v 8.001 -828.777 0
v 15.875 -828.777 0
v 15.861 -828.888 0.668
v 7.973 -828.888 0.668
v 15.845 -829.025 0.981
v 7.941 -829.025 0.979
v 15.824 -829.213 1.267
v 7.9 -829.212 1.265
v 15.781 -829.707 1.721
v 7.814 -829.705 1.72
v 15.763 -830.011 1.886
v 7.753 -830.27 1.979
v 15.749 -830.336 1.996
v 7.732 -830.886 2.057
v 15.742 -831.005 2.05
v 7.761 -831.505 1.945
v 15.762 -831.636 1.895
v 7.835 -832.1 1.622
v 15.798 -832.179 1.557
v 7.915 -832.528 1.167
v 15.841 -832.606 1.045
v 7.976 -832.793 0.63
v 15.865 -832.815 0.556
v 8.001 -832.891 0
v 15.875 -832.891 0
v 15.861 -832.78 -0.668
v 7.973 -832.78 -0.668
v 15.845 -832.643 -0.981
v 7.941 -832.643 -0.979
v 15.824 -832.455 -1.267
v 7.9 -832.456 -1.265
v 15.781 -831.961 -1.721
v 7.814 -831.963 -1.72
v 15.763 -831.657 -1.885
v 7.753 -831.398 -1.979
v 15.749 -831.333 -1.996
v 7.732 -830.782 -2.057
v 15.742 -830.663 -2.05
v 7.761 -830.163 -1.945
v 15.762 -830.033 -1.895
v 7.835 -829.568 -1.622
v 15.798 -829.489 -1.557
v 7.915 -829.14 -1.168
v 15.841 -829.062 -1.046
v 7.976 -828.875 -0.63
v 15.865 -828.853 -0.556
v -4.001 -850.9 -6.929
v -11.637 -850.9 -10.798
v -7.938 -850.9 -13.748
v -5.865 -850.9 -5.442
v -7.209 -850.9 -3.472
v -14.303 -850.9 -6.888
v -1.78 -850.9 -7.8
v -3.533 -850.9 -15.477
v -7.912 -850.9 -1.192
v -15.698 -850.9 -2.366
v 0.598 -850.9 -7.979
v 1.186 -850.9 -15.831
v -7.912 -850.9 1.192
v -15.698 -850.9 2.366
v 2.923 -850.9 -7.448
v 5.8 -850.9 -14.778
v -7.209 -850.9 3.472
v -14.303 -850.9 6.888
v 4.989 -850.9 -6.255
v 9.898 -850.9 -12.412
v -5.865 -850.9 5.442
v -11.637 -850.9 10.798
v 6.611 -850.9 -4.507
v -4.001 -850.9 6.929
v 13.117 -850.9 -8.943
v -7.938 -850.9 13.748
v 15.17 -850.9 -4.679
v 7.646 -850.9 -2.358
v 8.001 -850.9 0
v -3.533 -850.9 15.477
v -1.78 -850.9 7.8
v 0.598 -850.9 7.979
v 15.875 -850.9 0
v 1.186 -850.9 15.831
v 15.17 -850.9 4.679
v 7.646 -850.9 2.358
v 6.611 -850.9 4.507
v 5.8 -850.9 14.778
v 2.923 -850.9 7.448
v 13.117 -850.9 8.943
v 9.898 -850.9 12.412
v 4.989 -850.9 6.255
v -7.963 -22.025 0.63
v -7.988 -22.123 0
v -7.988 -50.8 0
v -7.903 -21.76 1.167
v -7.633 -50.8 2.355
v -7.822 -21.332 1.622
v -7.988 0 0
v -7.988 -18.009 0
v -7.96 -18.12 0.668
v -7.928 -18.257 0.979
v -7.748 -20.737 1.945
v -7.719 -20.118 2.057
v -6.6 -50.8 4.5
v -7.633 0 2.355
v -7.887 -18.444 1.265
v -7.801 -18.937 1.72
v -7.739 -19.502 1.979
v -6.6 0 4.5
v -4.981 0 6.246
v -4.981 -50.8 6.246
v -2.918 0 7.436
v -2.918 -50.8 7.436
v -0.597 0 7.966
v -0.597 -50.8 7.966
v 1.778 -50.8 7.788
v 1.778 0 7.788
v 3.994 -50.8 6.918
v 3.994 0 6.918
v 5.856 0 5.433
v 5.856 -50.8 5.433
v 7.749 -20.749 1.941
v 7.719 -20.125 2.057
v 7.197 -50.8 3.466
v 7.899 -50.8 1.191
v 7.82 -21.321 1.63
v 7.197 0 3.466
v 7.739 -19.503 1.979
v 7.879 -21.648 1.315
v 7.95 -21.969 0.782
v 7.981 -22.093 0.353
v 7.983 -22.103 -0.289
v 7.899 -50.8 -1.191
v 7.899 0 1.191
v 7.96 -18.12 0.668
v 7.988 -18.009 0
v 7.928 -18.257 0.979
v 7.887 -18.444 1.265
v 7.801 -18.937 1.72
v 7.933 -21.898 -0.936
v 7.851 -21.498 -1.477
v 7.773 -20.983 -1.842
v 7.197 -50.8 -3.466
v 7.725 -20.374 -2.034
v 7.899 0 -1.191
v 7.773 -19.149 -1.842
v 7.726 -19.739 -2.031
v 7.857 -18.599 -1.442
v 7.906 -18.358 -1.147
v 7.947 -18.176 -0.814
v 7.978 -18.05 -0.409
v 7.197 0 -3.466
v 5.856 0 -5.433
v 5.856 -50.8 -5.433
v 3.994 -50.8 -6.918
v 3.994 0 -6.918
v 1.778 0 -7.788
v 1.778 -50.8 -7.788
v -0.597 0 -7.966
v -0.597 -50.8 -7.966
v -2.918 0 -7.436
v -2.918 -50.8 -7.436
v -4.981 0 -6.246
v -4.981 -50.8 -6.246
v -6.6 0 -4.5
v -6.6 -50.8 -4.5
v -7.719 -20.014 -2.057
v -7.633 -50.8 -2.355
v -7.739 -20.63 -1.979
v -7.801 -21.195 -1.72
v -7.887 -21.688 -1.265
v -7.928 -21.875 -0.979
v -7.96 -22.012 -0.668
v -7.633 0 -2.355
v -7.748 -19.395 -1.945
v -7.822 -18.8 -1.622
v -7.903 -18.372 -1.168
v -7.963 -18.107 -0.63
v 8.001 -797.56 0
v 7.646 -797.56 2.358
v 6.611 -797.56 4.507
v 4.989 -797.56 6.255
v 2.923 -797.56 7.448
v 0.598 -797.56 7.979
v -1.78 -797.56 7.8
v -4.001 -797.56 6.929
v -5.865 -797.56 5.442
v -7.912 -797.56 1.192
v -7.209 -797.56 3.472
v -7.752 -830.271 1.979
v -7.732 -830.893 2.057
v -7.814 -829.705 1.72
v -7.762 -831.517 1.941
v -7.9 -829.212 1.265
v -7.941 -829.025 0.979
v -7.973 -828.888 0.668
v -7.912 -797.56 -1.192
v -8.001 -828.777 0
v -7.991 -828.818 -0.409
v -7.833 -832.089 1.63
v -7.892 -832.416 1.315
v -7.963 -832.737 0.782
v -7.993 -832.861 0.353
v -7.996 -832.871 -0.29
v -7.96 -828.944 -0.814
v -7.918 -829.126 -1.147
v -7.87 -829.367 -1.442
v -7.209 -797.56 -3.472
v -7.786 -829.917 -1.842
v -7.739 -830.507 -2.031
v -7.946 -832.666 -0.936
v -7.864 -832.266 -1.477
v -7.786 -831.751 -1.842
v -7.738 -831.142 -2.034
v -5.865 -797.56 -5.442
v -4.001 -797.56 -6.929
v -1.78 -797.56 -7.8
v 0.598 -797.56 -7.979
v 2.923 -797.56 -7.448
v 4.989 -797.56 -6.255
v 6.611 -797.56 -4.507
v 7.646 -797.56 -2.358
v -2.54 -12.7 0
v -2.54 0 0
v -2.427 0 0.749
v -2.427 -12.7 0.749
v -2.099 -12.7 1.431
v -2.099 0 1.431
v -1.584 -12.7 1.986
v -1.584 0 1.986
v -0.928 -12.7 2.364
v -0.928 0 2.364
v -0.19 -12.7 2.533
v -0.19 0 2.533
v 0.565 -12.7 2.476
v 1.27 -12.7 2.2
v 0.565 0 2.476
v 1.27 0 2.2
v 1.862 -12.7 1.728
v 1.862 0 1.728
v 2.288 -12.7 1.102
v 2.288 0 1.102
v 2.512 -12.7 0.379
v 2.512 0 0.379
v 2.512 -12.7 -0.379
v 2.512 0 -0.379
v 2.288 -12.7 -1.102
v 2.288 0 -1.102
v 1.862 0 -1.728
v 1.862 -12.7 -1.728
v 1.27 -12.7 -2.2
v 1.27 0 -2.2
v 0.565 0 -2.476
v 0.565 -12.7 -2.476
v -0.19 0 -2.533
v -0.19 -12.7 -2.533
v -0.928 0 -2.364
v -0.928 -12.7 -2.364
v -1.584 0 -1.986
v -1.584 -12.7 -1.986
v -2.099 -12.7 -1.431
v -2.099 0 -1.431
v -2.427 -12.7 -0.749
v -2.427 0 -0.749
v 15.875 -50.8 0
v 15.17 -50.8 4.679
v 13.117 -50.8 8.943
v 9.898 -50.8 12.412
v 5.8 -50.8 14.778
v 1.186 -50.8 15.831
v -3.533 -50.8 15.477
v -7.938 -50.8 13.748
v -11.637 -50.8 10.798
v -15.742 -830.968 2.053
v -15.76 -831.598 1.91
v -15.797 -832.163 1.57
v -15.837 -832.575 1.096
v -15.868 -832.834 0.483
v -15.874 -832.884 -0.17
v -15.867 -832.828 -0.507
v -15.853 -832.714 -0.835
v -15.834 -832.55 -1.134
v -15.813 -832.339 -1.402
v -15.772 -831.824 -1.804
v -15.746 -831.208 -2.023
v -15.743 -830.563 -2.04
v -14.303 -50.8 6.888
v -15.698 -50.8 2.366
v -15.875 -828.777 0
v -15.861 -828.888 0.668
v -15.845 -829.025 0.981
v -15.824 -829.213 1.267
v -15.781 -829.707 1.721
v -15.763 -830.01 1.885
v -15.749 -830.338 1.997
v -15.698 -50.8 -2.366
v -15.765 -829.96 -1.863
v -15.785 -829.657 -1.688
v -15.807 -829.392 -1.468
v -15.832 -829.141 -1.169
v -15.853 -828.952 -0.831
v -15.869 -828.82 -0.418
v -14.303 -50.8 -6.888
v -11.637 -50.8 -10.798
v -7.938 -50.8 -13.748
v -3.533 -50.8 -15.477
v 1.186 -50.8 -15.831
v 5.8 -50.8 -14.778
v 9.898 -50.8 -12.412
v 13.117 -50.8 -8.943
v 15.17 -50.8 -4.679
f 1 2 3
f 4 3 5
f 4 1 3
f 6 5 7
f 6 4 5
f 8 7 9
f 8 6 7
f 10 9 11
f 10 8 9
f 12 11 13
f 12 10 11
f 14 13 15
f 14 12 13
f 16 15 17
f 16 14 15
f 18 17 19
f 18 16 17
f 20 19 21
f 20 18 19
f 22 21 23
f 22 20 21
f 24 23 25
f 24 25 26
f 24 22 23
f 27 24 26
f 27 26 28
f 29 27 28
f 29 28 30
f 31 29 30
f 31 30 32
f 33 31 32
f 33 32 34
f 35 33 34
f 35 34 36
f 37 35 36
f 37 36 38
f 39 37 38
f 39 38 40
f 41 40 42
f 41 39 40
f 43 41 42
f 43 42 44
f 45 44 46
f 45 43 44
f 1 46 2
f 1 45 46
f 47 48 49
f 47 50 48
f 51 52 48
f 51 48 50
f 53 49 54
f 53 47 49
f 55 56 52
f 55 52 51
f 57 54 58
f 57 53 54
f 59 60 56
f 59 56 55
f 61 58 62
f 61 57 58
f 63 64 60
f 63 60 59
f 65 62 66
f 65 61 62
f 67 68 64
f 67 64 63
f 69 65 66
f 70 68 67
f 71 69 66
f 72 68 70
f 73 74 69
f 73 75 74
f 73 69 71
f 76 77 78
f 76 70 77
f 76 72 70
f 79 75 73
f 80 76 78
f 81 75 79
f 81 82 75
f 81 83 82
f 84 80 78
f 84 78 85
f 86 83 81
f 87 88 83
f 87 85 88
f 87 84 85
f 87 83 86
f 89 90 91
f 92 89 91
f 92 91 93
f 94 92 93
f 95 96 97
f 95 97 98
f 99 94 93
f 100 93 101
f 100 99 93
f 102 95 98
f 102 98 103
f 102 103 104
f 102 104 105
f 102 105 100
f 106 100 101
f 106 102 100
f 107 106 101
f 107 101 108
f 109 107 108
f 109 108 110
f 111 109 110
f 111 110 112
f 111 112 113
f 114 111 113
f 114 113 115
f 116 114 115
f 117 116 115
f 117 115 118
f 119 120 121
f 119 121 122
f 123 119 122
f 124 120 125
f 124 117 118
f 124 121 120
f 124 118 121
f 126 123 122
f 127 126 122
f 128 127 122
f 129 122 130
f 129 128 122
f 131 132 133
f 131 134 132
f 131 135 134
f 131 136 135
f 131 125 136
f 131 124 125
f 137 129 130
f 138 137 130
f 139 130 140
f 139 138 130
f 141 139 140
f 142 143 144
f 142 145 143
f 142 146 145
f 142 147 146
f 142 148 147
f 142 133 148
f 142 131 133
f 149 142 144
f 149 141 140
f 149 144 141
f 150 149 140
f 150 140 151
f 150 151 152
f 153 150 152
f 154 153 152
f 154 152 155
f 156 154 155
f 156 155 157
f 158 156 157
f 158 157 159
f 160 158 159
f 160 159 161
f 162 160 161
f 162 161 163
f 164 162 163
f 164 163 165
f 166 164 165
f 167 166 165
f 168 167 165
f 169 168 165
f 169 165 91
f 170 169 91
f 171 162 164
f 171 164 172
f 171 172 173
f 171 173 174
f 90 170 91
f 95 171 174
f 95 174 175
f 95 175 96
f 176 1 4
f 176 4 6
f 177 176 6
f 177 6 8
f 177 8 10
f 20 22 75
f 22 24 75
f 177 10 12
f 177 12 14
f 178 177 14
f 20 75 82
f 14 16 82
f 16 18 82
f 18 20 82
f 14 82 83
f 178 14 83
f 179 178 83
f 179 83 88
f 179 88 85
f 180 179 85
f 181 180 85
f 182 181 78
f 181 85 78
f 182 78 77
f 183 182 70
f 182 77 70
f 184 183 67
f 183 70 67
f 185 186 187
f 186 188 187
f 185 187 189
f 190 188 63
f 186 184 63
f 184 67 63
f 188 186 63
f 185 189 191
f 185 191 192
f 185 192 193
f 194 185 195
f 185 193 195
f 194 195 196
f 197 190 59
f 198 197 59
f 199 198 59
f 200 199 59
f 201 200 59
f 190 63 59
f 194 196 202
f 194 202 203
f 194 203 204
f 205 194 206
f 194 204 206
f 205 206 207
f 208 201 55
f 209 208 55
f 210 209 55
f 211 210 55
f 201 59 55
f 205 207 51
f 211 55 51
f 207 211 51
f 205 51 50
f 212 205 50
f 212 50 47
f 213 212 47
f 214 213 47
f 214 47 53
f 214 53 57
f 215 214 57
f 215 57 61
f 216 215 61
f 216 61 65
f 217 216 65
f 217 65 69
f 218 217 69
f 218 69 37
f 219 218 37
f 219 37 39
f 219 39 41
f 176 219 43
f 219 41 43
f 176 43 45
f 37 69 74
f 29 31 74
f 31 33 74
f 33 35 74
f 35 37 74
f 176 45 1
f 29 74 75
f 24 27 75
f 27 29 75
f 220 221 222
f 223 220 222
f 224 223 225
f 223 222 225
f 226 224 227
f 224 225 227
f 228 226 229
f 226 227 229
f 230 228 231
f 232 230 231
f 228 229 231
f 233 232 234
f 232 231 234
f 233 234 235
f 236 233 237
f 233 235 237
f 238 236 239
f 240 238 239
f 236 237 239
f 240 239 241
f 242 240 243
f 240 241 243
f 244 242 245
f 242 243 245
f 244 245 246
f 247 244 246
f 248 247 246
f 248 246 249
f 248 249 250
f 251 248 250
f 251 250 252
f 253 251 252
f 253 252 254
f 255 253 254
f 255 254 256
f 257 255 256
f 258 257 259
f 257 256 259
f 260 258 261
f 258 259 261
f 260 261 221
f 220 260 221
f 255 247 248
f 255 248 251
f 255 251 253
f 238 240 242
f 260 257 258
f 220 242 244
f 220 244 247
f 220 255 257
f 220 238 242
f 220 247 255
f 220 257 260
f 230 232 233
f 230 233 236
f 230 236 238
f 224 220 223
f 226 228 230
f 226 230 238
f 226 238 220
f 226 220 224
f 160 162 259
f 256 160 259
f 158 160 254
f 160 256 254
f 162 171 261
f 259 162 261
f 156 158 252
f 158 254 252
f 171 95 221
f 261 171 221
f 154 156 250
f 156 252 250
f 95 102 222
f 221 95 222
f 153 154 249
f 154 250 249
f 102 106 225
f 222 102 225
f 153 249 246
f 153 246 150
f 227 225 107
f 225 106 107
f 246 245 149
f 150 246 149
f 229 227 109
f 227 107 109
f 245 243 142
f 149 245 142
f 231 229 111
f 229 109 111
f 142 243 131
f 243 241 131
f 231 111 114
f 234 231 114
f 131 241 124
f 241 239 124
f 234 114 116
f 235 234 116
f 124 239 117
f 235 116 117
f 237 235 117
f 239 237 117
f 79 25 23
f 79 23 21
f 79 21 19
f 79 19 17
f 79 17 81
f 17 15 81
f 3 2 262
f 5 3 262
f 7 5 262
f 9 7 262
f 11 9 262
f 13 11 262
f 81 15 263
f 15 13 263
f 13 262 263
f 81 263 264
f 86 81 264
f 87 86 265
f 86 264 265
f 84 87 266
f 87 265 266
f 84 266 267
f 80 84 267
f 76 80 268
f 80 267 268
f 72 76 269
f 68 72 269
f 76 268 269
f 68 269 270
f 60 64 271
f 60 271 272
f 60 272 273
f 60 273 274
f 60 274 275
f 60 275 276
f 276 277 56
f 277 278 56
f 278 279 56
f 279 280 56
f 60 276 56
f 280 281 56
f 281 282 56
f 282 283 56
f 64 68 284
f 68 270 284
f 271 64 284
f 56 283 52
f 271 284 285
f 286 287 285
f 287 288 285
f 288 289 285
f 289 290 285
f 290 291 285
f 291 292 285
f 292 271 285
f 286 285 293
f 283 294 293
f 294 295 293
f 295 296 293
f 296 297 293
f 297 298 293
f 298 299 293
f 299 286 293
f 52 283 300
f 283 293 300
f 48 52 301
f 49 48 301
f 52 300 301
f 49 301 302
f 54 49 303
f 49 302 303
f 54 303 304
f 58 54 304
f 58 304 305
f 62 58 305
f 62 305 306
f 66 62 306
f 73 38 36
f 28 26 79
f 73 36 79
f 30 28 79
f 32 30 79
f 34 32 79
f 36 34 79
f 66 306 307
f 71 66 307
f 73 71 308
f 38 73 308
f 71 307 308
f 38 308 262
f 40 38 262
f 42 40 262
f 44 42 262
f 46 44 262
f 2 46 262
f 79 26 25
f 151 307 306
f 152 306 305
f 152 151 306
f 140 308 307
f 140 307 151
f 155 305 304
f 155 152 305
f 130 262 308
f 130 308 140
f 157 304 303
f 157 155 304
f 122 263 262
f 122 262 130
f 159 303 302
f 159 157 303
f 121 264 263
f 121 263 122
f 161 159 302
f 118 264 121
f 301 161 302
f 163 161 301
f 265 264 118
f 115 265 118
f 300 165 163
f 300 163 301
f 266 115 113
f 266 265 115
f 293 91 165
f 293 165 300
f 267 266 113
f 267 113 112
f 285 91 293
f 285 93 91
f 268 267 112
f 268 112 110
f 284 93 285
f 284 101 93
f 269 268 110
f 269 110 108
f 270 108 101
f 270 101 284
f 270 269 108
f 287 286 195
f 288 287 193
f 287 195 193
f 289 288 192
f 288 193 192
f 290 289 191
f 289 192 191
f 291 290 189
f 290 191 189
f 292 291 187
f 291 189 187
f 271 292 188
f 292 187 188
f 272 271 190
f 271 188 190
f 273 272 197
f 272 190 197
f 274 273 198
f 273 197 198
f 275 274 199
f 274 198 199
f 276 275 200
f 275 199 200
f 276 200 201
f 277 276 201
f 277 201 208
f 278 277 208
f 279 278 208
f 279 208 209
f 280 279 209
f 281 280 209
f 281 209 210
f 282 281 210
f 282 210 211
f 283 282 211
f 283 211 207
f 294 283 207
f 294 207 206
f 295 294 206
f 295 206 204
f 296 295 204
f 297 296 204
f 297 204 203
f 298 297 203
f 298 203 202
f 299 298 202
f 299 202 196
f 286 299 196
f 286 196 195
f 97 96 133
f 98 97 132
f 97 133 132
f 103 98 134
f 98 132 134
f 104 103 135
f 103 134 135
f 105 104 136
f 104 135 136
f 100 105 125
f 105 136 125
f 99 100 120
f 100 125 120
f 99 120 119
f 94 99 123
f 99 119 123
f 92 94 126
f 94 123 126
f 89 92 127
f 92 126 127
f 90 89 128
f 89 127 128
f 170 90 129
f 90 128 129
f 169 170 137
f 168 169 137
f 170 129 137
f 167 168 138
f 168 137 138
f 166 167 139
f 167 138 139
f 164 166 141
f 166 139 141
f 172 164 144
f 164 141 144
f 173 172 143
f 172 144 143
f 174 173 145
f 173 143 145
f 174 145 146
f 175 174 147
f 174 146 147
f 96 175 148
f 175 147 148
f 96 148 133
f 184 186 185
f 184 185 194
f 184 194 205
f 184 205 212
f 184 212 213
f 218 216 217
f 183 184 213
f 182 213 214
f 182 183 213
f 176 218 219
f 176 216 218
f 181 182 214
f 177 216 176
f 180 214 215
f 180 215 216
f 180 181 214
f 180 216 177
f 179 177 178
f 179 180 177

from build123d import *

# Parameters (mm, degrees)
F0_R     = 15.875
F1_DEPTH = 850.9
F2_R     = 8.001
F3_DEPTH = 53.34
F4_R     = 2.0574
F5_DEPTH = 25.4
F6_R     = 15.875
F6_R_2   = 7.9883
F7_DEPTH = 50.8
F8_R     = 2.54
F9_DEPTH = 12.7


with BuildPart() as f1:
    # F0 (on Front) → F1 (new body)
    with BuildSketch(Plane.XZ):
        Circle(F0_R)
    extrude(amount=F1_DEPTH)

    # F2 (on face) → F3 (cut)
    with BuildSketch(Plane.XZ.offset(850.9)):
        Circle(F2_R)
    extrude(amount=-F3_DEPTH, mode=Mode.SUBTRACT)

    # F4 (on Right) → F5 (cut, symmetric)
    with BuildSketch(Plane.YZ):
        with Locations((-830.834, 0)):
            Circle(F4_R)
        with Locations((-20.066, 0)):
            Circle(F4_R)
    extrude(amount=F5_DEPTH, both=True, mode=Mode.SUBTRACT)

    # F6 (on face) → F7 (cut)
    with BuildSketch(Plane(origin=(0, 0, 0), x_dir=(-1, 0, 0), z_dir=(0, 1, 0))):
        Circle(F6_R)
        Circle(F6_R_2, mode=Mode.SUBTRACT)
    extrude(amount=-F7_DEPTH, mode=Mode.SUBTRACT)

    # F8 (on face) → F9 (cut)
    with BuildSketch(Plane(origin=(0, 0, 0), x_dir=(-1, 0, 0), z_dir=(0, 1, 0))):
        Circle(F8_R)
    extrude(amount=-F9_DEPTH, mode=Mode.SUBTRACT)


solid = f1.part
